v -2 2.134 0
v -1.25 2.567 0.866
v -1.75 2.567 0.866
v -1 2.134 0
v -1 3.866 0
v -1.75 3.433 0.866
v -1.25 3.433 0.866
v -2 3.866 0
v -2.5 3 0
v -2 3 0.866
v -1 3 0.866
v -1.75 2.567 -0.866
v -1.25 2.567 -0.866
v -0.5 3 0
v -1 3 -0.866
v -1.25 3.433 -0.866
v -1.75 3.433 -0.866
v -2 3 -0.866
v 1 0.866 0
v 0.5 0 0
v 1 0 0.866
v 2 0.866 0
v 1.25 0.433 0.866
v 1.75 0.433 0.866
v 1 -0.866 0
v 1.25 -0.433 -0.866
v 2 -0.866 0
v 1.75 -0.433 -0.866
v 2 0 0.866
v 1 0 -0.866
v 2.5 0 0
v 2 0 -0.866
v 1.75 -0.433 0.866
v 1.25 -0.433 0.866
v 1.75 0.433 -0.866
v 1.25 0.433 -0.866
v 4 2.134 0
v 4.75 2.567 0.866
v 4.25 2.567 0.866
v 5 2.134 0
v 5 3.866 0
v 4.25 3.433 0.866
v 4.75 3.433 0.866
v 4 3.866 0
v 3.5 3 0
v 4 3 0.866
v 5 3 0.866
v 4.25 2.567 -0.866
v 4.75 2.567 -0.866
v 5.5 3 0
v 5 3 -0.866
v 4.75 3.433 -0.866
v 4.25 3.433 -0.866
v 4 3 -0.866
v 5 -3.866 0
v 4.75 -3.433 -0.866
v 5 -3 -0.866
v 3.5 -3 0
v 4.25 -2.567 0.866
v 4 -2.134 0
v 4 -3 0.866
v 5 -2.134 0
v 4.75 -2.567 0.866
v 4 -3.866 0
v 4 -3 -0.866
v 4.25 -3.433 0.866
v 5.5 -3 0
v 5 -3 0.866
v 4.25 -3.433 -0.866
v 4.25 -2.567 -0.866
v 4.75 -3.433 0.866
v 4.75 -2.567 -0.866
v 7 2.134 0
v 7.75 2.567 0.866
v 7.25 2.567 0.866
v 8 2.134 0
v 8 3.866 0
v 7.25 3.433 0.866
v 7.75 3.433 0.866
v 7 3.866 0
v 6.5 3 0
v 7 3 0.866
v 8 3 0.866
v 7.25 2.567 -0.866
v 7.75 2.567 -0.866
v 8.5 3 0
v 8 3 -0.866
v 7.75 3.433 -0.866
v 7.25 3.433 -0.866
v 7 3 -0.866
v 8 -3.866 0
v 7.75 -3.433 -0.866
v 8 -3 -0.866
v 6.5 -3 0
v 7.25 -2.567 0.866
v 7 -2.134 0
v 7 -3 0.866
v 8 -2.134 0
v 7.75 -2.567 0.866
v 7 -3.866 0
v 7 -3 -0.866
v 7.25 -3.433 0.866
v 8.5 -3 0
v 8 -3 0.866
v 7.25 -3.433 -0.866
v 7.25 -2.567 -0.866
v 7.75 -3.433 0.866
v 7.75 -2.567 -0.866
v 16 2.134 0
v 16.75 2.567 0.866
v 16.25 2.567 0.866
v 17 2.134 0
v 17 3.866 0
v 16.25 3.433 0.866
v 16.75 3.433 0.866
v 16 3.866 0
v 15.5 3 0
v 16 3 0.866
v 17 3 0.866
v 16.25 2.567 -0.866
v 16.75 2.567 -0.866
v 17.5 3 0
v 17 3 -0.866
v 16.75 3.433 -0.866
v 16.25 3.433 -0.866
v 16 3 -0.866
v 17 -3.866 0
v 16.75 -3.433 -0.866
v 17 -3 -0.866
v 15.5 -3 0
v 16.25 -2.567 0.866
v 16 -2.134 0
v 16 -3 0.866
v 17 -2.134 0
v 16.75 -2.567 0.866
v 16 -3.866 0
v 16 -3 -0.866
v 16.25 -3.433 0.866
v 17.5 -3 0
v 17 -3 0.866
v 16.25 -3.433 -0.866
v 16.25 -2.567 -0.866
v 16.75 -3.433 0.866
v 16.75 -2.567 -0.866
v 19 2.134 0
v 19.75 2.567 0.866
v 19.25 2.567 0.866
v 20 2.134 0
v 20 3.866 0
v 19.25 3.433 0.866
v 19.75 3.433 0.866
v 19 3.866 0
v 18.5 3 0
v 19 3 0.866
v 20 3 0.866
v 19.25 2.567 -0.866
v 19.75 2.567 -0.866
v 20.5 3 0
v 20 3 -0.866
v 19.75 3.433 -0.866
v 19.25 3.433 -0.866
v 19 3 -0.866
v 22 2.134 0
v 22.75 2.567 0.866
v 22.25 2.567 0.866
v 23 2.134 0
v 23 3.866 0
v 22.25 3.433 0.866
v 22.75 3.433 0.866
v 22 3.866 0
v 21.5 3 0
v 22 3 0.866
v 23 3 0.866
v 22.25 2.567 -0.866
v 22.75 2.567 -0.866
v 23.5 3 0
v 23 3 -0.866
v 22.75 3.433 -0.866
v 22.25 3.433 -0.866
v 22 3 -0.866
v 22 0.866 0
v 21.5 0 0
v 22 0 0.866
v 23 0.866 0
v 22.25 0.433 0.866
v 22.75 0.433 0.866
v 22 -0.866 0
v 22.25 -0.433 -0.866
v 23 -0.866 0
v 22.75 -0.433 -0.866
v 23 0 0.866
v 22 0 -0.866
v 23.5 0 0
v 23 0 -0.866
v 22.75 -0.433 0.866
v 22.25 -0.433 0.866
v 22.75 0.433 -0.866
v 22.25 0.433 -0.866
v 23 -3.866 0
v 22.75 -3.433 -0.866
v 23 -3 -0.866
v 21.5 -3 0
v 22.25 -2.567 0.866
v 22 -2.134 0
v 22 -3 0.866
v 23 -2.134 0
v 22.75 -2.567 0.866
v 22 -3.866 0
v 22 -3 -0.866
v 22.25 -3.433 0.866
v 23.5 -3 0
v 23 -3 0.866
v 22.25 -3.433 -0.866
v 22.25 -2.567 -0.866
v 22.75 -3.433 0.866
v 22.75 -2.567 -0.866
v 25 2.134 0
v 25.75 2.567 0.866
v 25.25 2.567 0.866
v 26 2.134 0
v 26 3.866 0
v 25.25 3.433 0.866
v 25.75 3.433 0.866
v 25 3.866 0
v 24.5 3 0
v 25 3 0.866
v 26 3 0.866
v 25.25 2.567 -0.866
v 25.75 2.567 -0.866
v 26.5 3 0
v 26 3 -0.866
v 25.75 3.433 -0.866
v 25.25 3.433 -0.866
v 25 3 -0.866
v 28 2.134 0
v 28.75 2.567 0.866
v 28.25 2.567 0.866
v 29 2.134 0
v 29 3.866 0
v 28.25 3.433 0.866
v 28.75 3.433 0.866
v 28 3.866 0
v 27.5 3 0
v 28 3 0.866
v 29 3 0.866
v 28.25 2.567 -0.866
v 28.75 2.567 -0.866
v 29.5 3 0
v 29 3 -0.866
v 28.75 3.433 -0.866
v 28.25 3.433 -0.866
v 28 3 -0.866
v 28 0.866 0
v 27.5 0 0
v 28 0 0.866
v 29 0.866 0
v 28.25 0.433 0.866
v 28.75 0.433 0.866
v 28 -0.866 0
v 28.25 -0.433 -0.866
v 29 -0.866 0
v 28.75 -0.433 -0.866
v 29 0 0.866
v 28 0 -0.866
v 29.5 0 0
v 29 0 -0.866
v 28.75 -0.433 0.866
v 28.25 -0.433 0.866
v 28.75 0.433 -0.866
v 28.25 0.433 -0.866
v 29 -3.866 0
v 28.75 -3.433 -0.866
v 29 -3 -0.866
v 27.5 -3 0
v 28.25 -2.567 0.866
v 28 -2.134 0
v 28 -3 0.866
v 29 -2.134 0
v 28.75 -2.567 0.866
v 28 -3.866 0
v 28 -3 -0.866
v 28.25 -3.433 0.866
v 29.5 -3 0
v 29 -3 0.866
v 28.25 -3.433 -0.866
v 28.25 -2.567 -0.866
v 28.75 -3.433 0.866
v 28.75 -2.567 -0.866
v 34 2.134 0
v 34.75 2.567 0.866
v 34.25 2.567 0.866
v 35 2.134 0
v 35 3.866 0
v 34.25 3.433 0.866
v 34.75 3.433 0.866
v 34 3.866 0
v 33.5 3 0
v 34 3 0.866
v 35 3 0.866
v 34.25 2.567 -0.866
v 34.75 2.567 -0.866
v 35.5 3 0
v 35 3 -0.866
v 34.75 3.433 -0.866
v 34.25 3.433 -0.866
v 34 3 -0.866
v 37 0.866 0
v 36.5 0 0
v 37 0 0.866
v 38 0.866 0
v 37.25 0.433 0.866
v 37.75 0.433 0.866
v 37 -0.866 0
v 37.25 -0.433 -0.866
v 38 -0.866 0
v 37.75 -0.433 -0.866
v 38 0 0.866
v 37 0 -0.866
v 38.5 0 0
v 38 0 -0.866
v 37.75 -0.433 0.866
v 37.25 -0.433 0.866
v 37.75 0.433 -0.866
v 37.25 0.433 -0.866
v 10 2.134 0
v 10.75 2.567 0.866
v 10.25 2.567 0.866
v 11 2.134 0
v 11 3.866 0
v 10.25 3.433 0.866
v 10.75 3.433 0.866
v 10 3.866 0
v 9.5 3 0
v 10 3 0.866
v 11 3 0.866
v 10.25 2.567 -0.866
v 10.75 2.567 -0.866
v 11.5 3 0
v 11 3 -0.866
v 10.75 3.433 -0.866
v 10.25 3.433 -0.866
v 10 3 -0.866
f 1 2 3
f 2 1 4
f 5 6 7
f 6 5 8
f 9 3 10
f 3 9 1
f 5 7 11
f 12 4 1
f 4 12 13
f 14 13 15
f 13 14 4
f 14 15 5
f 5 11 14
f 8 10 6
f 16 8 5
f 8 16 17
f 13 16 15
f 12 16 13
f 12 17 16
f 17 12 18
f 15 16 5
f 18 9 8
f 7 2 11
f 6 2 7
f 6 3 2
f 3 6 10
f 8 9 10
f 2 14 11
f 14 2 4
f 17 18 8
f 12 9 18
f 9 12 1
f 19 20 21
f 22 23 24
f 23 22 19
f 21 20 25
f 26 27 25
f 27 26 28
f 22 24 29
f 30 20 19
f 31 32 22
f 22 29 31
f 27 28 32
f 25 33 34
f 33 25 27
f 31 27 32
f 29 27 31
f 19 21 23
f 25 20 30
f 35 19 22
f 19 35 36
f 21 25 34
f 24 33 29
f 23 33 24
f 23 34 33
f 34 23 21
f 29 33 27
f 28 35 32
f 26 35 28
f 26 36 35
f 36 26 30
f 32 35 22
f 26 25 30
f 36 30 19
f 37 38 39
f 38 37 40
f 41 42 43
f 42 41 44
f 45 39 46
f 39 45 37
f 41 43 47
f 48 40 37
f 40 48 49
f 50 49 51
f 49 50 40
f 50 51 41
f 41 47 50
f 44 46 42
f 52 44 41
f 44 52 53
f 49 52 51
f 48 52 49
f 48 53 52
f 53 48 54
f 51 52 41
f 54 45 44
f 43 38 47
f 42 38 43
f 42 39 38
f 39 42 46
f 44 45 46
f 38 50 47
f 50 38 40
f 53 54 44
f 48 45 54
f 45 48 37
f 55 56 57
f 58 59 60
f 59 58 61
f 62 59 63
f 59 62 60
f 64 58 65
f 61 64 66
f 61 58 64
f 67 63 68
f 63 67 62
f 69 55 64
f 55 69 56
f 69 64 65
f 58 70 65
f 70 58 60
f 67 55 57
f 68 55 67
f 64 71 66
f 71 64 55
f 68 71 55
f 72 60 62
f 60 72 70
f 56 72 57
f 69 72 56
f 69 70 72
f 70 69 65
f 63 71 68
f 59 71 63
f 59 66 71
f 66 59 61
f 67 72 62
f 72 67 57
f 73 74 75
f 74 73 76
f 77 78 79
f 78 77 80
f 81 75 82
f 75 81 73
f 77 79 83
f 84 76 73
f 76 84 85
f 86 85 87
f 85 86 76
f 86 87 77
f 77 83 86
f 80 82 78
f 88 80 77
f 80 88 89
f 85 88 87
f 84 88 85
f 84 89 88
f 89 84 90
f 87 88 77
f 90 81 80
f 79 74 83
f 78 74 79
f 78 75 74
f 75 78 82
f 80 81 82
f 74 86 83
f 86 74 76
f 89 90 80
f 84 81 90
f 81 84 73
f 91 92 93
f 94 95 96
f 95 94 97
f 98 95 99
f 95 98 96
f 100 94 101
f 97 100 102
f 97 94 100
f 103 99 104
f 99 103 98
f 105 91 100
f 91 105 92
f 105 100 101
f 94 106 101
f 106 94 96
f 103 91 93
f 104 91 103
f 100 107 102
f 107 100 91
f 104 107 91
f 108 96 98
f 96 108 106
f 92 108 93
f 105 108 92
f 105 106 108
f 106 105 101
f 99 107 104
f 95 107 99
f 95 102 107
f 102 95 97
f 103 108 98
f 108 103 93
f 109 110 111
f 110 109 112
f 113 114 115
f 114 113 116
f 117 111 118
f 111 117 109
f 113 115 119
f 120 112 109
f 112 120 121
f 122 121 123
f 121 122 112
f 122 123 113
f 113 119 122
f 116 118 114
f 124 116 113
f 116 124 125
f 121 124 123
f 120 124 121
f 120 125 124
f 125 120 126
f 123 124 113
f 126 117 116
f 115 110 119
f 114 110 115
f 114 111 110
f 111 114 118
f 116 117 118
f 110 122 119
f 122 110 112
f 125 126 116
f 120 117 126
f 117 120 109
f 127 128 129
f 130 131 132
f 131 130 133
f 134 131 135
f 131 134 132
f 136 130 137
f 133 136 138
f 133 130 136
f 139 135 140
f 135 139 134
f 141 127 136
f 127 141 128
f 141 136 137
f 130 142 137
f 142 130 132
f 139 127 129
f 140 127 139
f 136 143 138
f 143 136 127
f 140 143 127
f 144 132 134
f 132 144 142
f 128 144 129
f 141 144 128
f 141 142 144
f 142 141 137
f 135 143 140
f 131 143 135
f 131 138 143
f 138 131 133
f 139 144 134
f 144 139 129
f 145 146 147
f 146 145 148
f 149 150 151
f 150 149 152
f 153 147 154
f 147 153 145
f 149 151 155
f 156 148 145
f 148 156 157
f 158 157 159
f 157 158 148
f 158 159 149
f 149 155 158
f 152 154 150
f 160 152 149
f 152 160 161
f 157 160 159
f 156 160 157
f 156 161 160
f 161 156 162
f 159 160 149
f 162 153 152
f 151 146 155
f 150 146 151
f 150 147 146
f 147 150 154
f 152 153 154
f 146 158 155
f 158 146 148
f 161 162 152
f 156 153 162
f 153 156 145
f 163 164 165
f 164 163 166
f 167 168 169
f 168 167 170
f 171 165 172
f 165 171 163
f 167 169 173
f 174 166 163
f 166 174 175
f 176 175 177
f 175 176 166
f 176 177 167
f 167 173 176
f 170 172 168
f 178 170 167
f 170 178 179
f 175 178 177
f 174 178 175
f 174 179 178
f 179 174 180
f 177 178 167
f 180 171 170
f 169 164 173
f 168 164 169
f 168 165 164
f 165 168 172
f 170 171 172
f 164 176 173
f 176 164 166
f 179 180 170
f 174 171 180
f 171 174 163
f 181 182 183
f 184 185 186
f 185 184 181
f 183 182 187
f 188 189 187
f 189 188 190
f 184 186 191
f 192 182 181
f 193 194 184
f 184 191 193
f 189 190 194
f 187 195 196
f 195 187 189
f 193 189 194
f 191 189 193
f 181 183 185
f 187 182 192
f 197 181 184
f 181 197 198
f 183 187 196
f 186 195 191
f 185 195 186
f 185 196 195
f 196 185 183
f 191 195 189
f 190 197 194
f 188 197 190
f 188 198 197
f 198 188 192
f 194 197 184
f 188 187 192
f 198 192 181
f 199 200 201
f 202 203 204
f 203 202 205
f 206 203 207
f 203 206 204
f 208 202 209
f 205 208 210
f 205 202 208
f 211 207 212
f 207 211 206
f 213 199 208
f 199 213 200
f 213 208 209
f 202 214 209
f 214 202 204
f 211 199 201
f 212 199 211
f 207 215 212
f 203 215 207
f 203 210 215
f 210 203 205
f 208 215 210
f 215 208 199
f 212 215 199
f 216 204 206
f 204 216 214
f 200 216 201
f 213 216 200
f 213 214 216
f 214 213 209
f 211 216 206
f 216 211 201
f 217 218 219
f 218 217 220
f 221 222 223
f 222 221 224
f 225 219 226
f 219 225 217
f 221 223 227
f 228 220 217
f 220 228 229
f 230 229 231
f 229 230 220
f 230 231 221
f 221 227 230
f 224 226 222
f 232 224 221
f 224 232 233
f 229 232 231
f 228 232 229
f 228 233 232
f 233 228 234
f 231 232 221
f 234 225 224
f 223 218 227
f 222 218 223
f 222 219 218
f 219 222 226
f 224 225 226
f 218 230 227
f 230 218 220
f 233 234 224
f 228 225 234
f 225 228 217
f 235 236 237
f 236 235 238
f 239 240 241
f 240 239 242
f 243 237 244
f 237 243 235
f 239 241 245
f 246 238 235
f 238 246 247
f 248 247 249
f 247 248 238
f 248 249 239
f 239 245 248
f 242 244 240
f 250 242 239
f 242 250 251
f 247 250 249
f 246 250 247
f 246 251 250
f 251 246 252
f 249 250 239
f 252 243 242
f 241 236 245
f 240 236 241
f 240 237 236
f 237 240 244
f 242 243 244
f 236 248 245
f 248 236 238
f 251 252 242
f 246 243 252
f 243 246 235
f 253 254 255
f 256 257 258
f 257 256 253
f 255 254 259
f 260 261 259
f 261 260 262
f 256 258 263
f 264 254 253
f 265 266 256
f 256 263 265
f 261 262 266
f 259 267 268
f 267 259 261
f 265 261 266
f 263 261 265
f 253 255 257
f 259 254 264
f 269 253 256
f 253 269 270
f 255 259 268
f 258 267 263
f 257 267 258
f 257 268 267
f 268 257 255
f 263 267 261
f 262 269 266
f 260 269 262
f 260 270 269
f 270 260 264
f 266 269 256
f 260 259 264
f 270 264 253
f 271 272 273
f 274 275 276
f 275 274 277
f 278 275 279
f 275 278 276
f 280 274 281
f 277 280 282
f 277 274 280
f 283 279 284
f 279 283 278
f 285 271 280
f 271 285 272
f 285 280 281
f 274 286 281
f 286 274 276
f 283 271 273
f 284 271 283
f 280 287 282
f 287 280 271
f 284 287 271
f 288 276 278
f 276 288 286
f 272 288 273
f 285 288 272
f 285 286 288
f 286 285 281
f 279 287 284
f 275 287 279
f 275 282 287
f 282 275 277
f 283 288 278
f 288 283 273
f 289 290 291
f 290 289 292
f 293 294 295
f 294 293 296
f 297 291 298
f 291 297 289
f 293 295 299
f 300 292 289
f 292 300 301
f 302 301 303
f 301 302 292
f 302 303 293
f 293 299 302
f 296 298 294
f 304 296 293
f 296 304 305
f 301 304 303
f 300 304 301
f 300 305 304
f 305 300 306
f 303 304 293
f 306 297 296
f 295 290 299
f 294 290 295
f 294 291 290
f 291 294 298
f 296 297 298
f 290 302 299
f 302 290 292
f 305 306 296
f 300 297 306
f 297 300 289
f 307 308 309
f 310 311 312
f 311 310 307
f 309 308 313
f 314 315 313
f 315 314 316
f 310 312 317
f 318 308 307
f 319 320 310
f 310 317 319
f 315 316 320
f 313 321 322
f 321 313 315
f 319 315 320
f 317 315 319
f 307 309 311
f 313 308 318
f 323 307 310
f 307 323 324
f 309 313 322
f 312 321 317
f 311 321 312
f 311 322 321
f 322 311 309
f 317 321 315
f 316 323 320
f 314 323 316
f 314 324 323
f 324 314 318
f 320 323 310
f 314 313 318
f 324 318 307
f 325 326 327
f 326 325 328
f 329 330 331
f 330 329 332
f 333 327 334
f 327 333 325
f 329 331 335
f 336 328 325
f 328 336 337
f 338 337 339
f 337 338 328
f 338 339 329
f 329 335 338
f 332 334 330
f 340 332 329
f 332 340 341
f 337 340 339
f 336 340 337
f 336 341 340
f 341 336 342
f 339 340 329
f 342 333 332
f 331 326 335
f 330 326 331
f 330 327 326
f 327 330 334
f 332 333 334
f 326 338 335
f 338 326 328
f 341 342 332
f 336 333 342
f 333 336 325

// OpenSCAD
/*[Begin Variables]*/
word = "Example";
$fn = 6;

/*[hidden*/
braille_conversion_db =[
["CAPS",  [6]          ],
//Capital Letters
//todo still, make them put the cap before hand
["A",   [1]            ],
["B",   [1, 2]         ],
["C",   [1, 4]         ],
["D",   [1, 4, 5]      ],
["E",   [1, 5]         ],
["F",   [1, 2, 4]      ],
["G",   [1, 2, 4, 5]   ],
["H",   [1, 2, 5]      ],
["I",   [2, 4]         ],
["J",   [2, 4, 5]      ],
["K",   [1, 3]         ],
["L",   [1, 2, 3]      ],
["M",   [1, 3, 4]      ],
["N",   [1, 3, 4, 5]   ],
["O",   [1, 3, 5,]     ],
["P",   [1, 2, 3, 4]   ],
["Q",   [1, 2, 3, 4, 5]],
["R",   [1, 2, 3, 5]   ],
["S",   [2, 3, 4,]     ],
["T",   [2, 3, 4, 5]   ],
["U",   [1, 3, 6,]     ],
["V",   [1, 2, 3, 6]   ],
["W",   [2, 4, 5, 6]   ],
["X",   [1, 3, 4, 6]   ],
["Y",   [1, 3, 4, 5, 6]],
["Z",   [1, 3, 5, 6]   ],
//lowercase letters
["a",   [1]            ],
["b",   [1, 2]         ],
["c",   [1, 4]         ],
["d",   [1, 4, 5]      ],
["e",   [1, 5]         ],
["f",   [1, 2, 4]      ],
["g",   [1, 2, 4, 5]   ],
["h",   [1, 2, 5]      ],
["i",   [2, 4]         ],
["j",   [2, 4, 5]      ],
["k",   [1, 3]         ],
["l",   [1, 2, 3]      ],
["m",   [1, 3, 4]      ],
["n",   [1, 3, 4, 5]   ],
["o",   [1, 3, 5,]     ],
["p",   [1, 2, 3, 4]   ],
["q",   [1, 2, 3, 4, 5]],
["r",   [1, 2, 3, 5]   ],
["s",   [2, 3, 4,]     ],
["t",   [2, 3, 4, 5]   ],
["u",   [1, 3, 6,]     ],
["v",   [1, 2, 3, 6]   ],
["w",   [2, 4, 5, 6]   ],
["x",   [1, 3, 4, 6]   ],
["y",   [1, 3, 4, 5, 6]],
["z",   [1, 3, 5, 6]   ],
//Numbers
["0",   [2, 4, 5]      ],
["1",   [1]            ],
["2",   [1, 2]         ],
["3",   [1, 4]         ],
["4",   [1, 4, 5]      ],
["5",   [1, 5]         ],
["6",   [1, 2, 4]      ],
["7",   [1, 2, 4, 5]   ],
["8",   [1, 2, 5]      ],
["9",   [2, 4]         ],
//other symbols
["!",   [2, 3, 5,]     ],
[",",   [2]            ],
["-",   [3, 6]         ],
[".",   [2, 5, 6]      ],
["?",   [2, 3, 6]      ],
["#",   [3, 4, 5, 6]   ],
[" ",   []             ]
];

module drawDot(pos = 0)
{
  if(pos == 1)
    translate([-1.5,3,0])
      sphere(center = true);
  else if(pos == 2)
    translate([-1.5,0,0])
      sphere(center = true);
  else if(pos == 3)
    translate([-1.5,-3,0])
      sphere(center = true);
  else if(pos == 4)
    translate([1.5,3,0])
      sphere(center = true);
  else if(pos == 5)
    translate([1.5,0,0])
      sphere(center = true);
  else if(pos == 6)
    translate([1.5,-3,0])
      sphere(center = true);
}
module brailConversion(word = " "){
  temp = search(str(word), braille_conversion_db);
  echo(temp);
  for(num = [0:len(temp)]){
    translate([6*num,0,0])
    {
      for(dot = braille_conversion_db[temp[num]][1]){
        drawDot(dot);
      }
    }
  }
}

brailConversion(word);
